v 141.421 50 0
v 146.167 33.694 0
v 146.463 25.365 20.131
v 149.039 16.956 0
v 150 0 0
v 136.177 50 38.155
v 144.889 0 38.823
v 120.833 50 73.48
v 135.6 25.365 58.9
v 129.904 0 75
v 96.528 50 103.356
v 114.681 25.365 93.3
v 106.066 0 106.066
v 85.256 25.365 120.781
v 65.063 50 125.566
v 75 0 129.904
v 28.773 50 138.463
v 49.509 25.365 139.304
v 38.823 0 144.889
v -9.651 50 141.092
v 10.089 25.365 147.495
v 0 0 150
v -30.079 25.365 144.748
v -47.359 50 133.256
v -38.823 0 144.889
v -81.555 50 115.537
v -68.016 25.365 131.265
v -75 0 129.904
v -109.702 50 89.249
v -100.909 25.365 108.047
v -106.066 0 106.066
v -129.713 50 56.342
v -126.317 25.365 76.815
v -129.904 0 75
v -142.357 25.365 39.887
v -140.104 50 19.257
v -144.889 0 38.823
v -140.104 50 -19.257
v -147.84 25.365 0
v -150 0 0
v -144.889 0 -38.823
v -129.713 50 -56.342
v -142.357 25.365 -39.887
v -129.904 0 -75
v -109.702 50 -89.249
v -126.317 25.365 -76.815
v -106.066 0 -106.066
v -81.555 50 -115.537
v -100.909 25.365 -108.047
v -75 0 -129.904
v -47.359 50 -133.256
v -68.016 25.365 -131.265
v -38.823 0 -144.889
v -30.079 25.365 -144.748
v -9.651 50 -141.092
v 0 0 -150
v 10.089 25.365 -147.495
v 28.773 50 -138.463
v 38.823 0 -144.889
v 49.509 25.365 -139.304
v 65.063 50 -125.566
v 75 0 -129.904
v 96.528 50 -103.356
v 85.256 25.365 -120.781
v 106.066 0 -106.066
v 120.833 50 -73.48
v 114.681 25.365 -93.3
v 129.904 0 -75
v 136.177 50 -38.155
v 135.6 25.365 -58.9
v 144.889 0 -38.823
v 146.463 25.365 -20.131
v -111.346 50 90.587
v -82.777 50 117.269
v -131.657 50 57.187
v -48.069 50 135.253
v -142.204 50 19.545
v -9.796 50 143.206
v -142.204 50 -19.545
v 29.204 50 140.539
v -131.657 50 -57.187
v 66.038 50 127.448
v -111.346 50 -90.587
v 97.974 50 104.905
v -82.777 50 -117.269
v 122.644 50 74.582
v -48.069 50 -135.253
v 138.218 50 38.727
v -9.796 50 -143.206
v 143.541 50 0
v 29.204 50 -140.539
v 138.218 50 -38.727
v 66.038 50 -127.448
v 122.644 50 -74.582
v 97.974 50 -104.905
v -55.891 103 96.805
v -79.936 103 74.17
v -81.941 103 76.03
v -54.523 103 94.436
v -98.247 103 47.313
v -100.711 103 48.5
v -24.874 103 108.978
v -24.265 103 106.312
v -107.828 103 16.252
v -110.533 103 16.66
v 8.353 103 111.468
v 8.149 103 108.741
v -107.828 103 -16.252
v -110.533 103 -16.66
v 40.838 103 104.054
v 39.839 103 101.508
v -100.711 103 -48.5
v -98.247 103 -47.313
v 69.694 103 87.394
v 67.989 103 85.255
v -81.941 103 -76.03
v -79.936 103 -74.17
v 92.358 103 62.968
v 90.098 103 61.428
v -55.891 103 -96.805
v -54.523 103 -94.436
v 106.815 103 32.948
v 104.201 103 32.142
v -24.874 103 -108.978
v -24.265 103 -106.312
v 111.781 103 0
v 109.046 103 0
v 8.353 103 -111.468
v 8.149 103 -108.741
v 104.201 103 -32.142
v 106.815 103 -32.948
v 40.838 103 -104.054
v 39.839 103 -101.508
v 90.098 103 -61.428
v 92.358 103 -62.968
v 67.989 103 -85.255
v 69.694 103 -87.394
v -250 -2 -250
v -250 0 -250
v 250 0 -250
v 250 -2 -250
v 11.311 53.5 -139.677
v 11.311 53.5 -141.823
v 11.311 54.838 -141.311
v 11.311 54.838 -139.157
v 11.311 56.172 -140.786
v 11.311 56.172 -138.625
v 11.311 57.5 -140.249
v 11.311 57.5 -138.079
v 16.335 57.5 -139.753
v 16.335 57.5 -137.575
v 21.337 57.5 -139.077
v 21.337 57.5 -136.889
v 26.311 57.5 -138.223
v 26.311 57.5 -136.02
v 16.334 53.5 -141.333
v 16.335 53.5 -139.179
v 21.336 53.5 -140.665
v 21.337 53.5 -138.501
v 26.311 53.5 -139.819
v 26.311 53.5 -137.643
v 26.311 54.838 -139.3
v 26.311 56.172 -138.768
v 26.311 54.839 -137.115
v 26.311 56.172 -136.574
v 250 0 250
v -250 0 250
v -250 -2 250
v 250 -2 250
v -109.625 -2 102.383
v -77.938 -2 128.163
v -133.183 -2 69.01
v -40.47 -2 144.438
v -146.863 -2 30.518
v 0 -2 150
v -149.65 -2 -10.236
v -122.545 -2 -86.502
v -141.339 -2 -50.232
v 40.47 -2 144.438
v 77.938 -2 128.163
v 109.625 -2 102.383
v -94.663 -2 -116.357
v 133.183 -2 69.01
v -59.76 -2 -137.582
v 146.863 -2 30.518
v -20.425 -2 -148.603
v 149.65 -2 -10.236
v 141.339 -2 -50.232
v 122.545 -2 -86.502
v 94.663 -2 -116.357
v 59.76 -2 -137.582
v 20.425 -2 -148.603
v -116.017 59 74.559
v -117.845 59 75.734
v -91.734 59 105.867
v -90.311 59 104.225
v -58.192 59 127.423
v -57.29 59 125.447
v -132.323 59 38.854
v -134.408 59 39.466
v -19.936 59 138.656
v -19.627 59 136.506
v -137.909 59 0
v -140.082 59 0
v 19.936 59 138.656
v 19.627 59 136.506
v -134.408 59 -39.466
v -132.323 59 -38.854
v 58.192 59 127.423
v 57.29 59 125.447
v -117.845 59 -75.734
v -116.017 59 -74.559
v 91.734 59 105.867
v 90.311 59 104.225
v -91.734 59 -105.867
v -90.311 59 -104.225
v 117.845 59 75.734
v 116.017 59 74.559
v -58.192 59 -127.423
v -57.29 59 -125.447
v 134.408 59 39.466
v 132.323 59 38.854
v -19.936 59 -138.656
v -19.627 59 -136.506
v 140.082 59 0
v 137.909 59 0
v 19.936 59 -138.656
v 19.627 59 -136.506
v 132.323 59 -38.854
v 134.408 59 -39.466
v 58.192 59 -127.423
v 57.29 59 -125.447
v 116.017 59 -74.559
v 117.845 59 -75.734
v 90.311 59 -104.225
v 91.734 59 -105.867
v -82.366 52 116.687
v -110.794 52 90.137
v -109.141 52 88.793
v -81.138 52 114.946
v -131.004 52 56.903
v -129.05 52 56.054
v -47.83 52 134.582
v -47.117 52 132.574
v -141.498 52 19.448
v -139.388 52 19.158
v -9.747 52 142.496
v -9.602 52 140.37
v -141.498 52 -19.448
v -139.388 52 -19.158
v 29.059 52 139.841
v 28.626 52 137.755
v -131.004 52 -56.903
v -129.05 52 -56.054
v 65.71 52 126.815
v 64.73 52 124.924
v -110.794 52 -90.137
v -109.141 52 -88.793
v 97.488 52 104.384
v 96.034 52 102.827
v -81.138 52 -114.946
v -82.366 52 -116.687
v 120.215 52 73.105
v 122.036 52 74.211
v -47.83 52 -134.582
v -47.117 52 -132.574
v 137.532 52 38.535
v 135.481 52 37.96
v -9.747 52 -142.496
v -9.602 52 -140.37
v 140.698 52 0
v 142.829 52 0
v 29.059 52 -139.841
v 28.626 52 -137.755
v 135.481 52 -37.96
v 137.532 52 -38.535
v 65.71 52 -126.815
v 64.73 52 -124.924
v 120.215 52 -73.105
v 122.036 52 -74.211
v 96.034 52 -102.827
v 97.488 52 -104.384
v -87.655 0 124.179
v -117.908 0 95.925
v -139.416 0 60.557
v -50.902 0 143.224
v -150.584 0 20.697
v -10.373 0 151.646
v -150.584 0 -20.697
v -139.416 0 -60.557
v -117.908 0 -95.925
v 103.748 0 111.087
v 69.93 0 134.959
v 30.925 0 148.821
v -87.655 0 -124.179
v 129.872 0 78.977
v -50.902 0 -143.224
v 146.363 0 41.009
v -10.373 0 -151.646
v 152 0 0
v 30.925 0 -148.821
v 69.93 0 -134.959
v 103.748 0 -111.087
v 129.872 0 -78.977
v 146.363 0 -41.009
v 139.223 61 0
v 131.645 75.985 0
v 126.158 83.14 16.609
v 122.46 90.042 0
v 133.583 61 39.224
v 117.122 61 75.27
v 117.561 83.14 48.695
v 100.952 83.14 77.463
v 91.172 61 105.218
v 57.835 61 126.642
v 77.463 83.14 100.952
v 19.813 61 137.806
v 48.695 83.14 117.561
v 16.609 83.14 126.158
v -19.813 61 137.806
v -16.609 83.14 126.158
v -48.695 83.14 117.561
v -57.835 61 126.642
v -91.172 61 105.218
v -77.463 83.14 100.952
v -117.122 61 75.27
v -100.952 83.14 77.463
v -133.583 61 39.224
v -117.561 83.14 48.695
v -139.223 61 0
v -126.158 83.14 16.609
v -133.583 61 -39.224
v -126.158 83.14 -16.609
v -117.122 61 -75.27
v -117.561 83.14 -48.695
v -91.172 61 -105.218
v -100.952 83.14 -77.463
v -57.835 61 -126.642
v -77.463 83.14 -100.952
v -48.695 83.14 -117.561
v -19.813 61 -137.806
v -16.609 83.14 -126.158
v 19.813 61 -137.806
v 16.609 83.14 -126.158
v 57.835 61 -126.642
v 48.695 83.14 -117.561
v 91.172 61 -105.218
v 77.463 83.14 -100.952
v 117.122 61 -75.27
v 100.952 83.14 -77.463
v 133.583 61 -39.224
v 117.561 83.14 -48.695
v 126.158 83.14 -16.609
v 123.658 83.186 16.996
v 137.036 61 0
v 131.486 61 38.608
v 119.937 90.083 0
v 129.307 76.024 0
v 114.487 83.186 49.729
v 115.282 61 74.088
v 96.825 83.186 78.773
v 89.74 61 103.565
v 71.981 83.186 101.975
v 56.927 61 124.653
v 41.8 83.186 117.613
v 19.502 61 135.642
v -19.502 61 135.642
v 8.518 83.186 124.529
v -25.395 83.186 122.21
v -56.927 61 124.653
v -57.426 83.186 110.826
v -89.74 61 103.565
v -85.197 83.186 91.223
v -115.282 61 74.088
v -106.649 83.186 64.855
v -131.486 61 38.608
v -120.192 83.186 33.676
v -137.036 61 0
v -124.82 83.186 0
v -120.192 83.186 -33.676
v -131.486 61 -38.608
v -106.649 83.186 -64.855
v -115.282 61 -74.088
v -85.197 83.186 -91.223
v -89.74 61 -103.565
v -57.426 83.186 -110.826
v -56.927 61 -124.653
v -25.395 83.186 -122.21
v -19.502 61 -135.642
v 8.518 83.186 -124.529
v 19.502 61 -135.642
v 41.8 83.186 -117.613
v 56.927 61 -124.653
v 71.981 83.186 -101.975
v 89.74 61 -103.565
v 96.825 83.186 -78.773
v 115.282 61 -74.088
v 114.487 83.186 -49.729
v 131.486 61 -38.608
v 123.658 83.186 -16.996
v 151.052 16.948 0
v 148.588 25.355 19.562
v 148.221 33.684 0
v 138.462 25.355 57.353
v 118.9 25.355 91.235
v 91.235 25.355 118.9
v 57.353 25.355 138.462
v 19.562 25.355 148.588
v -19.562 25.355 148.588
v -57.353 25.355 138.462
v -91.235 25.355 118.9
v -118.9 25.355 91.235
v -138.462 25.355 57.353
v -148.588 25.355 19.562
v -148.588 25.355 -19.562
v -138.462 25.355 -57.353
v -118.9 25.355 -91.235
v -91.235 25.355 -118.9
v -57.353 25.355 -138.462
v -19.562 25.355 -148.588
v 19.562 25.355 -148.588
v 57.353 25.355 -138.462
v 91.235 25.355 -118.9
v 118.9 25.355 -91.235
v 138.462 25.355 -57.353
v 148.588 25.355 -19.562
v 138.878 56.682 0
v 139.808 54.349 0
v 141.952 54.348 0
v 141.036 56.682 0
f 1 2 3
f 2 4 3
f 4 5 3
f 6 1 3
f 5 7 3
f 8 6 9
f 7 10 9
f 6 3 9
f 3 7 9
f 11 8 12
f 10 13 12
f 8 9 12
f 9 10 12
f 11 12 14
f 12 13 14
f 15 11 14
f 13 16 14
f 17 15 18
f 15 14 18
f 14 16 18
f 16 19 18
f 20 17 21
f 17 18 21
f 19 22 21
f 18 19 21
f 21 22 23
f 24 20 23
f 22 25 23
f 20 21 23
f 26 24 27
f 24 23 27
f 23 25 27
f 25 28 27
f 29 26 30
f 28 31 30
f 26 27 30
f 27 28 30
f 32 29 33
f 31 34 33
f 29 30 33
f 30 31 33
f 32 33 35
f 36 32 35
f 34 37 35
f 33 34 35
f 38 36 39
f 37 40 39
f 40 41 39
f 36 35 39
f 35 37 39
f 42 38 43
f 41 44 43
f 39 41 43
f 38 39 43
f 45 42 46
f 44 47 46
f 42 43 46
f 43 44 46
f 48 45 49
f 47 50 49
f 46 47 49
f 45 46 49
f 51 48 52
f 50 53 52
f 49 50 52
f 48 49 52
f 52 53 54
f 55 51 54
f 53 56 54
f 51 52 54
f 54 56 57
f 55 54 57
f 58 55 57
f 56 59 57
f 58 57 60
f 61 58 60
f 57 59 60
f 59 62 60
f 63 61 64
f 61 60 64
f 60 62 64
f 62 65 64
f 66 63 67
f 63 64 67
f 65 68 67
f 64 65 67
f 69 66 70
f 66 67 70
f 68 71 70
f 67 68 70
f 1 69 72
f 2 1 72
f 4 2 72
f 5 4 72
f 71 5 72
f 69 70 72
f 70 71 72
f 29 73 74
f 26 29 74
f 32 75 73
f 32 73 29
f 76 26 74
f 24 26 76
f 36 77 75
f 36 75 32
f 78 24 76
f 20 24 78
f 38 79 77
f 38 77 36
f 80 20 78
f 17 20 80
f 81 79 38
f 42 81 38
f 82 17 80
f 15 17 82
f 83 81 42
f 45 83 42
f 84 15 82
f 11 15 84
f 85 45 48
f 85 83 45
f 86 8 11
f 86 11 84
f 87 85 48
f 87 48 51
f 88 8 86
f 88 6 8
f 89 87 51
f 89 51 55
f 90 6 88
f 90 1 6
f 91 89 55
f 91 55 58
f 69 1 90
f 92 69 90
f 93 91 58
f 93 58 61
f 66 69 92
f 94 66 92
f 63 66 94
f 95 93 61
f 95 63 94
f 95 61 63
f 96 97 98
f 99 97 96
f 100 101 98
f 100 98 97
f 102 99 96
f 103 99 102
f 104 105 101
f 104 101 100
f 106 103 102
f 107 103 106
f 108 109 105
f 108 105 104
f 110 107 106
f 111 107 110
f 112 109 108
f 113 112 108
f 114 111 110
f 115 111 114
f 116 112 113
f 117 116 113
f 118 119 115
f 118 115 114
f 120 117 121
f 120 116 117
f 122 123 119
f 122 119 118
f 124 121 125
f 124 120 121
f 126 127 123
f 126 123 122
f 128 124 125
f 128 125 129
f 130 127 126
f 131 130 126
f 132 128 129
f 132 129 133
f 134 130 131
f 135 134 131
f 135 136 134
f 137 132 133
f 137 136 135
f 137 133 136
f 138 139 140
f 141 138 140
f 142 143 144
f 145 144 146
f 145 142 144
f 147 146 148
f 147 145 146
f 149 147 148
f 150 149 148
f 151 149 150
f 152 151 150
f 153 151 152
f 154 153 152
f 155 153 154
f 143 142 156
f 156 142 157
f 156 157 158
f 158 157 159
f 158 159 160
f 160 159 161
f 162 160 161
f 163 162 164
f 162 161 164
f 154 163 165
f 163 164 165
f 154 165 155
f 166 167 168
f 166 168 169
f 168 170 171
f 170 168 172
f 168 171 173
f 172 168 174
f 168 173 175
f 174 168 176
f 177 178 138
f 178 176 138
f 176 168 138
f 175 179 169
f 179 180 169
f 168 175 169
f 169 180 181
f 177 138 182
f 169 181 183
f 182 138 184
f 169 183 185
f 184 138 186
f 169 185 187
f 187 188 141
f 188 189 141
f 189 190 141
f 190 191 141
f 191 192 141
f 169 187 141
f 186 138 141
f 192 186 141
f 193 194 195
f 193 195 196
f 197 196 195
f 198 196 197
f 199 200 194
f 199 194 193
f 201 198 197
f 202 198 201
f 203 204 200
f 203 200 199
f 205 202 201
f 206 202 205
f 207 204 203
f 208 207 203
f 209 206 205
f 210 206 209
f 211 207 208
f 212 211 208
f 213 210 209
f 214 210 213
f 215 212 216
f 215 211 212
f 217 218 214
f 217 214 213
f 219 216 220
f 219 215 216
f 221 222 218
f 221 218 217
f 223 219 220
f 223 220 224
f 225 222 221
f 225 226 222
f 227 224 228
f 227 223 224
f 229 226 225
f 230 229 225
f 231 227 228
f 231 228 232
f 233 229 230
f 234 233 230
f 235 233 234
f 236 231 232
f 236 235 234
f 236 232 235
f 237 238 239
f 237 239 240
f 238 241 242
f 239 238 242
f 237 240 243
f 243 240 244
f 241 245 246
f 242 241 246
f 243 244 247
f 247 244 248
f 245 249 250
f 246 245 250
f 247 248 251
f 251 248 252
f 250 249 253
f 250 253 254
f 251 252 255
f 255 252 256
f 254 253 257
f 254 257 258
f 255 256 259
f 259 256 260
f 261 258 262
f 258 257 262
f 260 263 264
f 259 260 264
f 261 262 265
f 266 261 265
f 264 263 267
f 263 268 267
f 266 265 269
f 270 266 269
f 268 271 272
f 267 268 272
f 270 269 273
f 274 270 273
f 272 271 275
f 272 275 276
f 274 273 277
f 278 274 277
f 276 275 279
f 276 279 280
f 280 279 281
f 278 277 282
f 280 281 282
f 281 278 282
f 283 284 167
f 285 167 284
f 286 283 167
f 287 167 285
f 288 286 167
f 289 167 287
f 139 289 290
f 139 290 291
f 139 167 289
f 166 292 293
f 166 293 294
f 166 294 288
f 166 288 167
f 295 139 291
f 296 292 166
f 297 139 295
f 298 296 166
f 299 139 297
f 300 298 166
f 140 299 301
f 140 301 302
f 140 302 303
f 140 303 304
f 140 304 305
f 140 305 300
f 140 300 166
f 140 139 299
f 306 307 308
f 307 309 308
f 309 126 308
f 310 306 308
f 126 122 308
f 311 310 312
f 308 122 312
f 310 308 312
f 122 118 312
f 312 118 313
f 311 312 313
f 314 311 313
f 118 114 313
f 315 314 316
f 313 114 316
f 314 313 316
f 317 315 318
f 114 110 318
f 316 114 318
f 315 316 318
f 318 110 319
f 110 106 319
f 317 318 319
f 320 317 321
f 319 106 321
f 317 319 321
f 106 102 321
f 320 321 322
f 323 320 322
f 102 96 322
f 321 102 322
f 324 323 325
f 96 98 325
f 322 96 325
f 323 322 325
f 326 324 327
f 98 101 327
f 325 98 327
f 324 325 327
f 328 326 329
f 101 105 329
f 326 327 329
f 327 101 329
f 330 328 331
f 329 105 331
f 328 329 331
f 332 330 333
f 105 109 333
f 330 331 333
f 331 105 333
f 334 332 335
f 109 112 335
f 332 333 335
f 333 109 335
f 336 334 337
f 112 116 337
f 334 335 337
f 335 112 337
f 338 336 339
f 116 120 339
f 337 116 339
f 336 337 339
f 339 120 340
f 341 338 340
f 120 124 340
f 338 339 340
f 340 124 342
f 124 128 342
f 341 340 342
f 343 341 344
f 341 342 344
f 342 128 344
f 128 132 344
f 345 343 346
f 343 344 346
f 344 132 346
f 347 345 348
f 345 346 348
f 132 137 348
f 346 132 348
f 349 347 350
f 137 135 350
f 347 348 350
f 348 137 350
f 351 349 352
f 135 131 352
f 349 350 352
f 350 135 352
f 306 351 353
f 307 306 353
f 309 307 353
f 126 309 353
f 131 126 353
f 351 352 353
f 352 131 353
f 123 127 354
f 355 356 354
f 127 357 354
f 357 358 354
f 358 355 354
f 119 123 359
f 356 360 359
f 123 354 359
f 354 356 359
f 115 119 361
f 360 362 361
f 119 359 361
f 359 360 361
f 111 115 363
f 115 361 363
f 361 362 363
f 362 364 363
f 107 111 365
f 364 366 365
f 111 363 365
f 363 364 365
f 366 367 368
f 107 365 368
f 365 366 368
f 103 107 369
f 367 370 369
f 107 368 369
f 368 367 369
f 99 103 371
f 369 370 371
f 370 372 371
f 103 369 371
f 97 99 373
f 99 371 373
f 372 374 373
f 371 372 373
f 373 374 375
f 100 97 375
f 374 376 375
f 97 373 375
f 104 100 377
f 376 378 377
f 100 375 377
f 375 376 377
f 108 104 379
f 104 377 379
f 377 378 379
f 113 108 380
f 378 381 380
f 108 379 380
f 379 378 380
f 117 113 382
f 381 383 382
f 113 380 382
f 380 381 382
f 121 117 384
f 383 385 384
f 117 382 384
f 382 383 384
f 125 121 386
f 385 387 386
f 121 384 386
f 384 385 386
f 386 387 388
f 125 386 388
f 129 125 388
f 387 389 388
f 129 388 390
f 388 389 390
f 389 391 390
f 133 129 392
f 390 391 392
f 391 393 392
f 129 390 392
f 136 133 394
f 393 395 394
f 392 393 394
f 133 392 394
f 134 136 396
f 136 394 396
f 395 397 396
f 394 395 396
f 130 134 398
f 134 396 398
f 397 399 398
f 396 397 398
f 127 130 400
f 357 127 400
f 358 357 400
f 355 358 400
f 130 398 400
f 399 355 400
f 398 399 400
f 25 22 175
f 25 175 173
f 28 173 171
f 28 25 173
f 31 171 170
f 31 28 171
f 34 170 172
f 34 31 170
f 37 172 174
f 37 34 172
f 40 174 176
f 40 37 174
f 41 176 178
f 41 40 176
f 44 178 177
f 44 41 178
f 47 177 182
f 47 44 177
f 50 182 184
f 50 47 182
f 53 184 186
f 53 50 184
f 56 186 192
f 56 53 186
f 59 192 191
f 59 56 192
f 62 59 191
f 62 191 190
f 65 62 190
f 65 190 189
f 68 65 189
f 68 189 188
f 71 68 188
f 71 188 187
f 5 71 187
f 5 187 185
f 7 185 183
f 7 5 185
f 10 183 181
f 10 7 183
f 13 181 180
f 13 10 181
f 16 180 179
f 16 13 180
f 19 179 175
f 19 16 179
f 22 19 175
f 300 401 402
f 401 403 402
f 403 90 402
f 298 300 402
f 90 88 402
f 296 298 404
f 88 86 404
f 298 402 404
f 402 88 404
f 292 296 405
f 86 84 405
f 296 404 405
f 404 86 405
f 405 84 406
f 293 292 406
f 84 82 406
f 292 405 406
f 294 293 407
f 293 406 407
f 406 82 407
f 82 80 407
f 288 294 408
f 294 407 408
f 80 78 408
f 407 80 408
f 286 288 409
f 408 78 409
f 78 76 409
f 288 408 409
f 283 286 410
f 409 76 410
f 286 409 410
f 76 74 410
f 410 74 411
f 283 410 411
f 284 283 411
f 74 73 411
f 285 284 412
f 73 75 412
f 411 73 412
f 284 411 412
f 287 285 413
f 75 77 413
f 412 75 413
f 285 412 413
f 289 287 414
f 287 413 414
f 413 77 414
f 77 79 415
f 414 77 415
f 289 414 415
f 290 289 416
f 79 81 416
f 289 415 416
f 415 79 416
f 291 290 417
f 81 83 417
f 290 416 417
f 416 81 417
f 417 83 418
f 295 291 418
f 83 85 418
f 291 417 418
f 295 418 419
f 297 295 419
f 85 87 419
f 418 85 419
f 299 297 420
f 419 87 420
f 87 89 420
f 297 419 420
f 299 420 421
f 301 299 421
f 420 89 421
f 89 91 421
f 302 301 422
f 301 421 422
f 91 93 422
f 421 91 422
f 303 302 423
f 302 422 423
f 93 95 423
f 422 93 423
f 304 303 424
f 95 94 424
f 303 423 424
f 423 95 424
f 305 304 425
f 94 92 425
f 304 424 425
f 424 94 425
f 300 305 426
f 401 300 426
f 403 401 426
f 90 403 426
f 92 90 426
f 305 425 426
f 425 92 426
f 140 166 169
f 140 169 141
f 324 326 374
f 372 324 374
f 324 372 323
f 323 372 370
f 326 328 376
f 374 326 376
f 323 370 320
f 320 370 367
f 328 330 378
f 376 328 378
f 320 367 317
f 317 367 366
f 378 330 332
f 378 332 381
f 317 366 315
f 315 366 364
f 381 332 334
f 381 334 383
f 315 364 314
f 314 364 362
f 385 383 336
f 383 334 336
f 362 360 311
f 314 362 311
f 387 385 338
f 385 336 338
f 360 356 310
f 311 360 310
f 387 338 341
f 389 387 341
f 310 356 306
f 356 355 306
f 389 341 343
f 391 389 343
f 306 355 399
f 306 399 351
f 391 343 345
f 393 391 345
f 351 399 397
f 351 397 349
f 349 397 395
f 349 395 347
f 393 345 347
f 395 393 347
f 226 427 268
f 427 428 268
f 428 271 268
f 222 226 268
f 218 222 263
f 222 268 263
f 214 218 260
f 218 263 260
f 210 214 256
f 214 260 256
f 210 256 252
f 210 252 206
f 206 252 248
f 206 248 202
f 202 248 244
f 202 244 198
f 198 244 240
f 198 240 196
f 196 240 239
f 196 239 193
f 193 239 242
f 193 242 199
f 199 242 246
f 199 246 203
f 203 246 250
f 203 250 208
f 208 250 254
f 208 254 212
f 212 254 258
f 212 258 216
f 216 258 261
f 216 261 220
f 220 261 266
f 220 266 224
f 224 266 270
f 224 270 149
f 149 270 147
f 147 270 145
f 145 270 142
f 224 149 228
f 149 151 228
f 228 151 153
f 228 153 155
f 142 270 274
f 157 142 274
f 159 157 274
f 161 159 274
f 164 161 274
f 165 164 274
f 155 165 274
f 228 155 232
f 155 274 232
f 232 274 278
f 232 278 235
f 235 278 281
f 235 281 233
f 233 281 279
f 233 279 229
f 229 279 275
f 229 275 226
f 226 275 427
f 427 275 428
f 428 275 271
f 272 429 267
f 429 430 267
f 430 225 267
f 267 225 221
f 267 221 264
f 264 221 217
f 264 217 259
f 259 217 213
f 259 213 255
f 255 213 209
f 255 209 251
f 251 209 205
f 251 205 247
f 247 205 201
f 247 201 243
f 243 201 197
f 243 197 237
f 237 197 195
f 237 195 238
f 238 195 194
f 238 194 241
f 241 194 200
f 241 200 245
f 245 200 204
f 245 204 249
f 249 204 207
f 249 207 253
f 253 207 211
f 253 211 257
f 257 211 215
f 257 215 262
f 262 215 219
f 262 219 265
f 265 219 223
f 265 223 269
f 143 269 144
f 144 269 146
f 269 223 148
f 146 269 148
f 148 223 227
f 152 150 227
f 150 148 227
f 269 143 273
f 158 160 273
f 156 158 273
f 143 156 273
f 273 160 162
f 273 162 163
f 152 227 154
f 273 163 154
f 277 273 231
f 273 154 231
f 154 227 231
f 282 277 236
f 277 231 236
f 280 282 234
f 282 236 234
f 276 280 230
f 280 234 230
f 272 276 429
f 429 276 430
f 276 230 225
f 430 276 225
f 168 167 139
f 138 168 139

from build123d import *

# Parameters (mm, degrees)
SKETCH1_W               = 500
SKETCH1_H               = 500
BASE_FLANGE1_DEPTH      = 2
CUT_EXTRUDE1_DEPTH      = 385.84282506
CUT_EXTRUDE1_DEPTH_BACK = 385.84282506
SKETCH8_W               = 401.481262669
SKETCH8_H               = 2
SKETCH8_W_2             = 494.130784823
CUT_EXTRUDE2_DEPTH      = 386.637135141
CUT_EXTRUDE2_DEPTH_BACK = 2
SKETCH15_R              = 150
CUT_EXTRUDE3_DEPTH      = 385.84282506
CUT_EXTRUDE3_DEPTH_BACK = 385.84282506
SKETCH16_W              = 352.950560588
SKETCH16_H              = 50
SKETCH17_W              = 15
SKETCH17_H              = 4
CUT_EXTRUDE5_DEPTH      = 150


# Sheet-metal steps are written as plain solids
with BuildPart() as part:
    # Sketch1 → Base-Flange1 (new body)
    with BuildSketch(Plane(origin=(0, 0, 0), x_dir=(1, 0, 0), z_dir=(0, 1, 0))):
        Rectangle(SKETCH1_W, SKETCH1_H)
    extrude(amount=-BASE_FLANGE1_DEPTH)

    # Sketch7 → Revolve1 (revolve)
    with BuildSketch(Plane.XY, mode=Mode.PRIVATE) as revolve1_sk:
        with BuildLine():
            Line((0, 152), (0, 150))
            ThreePointArc((0, 150), (-106.066017178, 106.066017178), (-150, 0))
            Line((-150, 0), (-152, 0))
            ThreePointArc((-152, 0), (-107.48023074, 107.48023074), (0, 152))
        make_face()
    revolve(revolve1_sk.sketch.rotate(Axis((0, 194.50152145, 0), (0, -1, 0)), 180), axis=Axis((0, 194.50152145, 0), (0, -1, 0)))

    # Sketch8 → Cut-Extrude1 (cut, two sides: drawn at the far end of the back side and taken through both)
    with BuildSketch(Plane.XY.offset(-CUT_EXTRUDE1_DEPTH_BACK)):
        with Locations((-16.544557528, 60)):
            Rectangle(SKETCH8_W, SKETCH8_H)
        with Locations((18.750498531, 51)):
            Rectangle(SKETCH8_W_2, SKETCH8_H)
    extrude(amount=CUT_EXTRUDE1_DEPTH + CUT_EXTRUDE1_DEPTH_BACK, mode=Mode.SUBTRACT)


with BuildPart() as cut_extrude1_piece_1:
    # of the separate pieces the step leaves, piece 1, a body of its own (cut_extrude1_pieces)
    add(part.part.solids().sort_by_distance((-250, 0, -250))[0])

    # Sketch15 → Cut-Extrude2 (cut, two sides: drawn at the far end of the back side and taken through both)
    with BuildSketch(Plane.XZ.offset(2).offset(-CUT_EXTRUDE2_DEPTH_BACK)):
        with Locations(Location((0, 0, 0), (0, 0, 90))):
            Circle(SKETCH15_R)
    extrude(amount=CUT_EXTRUDE2_DEPTH + CUT_EXTRUDE2_DEPTH_BACK, mode=Mode.SUBTRACT)


with BuildPart() as cut_extrude1_piece_2:
    # of the separate pieces the step leaves, piece 2, a body of its own (cut_extrude1_pieces)
    add(part.part.solids().sort_by_distance((139.222842953, 61, 0))[0])

    # Sketch16 → Cut-Extrude3 (cut, two sides: drawn at the far end of the back side and taken through both)
    with BuildSketch(Plane.XY.offset(-CUT_EXTRUDE3_DEPTH_BACK)):
        with Locations((-5.514852509, 128)):
            Rectangle(SKETCH16_W, SKETCH16_H)
    extrude(amount=CUT_EXTRUDE3_DEPTH + CUT_EXTRUDE3_DEPTH_BACK, mode=Mode.SUBTRACT)


with BuildPart() as cut_extrude1_piece_3:
    # of the separate pieces the step leaves, piece 3, a body of its own (cut_extrude1_pieces)
    add(part.part.solids().sort_by_distance((142.828568571, 52, 0))[0])

    # Sketch17 → Cut-Extrude5 (cut)
    with BuildSketch(Plane.XY):
        with Locations((18.811352245, 55.5)):
            Rectangle(SKETCH17_W, SKETCH17_H)
    extrude(amount=-CUT_EXTRUDE5_DEPTH, mode=Mode.SUBTRACT)


solid = Compound([cut_extrude1_piece_1.part, cut_extrude1_piece_2.part, cut_extrude1_piece_3.part])
